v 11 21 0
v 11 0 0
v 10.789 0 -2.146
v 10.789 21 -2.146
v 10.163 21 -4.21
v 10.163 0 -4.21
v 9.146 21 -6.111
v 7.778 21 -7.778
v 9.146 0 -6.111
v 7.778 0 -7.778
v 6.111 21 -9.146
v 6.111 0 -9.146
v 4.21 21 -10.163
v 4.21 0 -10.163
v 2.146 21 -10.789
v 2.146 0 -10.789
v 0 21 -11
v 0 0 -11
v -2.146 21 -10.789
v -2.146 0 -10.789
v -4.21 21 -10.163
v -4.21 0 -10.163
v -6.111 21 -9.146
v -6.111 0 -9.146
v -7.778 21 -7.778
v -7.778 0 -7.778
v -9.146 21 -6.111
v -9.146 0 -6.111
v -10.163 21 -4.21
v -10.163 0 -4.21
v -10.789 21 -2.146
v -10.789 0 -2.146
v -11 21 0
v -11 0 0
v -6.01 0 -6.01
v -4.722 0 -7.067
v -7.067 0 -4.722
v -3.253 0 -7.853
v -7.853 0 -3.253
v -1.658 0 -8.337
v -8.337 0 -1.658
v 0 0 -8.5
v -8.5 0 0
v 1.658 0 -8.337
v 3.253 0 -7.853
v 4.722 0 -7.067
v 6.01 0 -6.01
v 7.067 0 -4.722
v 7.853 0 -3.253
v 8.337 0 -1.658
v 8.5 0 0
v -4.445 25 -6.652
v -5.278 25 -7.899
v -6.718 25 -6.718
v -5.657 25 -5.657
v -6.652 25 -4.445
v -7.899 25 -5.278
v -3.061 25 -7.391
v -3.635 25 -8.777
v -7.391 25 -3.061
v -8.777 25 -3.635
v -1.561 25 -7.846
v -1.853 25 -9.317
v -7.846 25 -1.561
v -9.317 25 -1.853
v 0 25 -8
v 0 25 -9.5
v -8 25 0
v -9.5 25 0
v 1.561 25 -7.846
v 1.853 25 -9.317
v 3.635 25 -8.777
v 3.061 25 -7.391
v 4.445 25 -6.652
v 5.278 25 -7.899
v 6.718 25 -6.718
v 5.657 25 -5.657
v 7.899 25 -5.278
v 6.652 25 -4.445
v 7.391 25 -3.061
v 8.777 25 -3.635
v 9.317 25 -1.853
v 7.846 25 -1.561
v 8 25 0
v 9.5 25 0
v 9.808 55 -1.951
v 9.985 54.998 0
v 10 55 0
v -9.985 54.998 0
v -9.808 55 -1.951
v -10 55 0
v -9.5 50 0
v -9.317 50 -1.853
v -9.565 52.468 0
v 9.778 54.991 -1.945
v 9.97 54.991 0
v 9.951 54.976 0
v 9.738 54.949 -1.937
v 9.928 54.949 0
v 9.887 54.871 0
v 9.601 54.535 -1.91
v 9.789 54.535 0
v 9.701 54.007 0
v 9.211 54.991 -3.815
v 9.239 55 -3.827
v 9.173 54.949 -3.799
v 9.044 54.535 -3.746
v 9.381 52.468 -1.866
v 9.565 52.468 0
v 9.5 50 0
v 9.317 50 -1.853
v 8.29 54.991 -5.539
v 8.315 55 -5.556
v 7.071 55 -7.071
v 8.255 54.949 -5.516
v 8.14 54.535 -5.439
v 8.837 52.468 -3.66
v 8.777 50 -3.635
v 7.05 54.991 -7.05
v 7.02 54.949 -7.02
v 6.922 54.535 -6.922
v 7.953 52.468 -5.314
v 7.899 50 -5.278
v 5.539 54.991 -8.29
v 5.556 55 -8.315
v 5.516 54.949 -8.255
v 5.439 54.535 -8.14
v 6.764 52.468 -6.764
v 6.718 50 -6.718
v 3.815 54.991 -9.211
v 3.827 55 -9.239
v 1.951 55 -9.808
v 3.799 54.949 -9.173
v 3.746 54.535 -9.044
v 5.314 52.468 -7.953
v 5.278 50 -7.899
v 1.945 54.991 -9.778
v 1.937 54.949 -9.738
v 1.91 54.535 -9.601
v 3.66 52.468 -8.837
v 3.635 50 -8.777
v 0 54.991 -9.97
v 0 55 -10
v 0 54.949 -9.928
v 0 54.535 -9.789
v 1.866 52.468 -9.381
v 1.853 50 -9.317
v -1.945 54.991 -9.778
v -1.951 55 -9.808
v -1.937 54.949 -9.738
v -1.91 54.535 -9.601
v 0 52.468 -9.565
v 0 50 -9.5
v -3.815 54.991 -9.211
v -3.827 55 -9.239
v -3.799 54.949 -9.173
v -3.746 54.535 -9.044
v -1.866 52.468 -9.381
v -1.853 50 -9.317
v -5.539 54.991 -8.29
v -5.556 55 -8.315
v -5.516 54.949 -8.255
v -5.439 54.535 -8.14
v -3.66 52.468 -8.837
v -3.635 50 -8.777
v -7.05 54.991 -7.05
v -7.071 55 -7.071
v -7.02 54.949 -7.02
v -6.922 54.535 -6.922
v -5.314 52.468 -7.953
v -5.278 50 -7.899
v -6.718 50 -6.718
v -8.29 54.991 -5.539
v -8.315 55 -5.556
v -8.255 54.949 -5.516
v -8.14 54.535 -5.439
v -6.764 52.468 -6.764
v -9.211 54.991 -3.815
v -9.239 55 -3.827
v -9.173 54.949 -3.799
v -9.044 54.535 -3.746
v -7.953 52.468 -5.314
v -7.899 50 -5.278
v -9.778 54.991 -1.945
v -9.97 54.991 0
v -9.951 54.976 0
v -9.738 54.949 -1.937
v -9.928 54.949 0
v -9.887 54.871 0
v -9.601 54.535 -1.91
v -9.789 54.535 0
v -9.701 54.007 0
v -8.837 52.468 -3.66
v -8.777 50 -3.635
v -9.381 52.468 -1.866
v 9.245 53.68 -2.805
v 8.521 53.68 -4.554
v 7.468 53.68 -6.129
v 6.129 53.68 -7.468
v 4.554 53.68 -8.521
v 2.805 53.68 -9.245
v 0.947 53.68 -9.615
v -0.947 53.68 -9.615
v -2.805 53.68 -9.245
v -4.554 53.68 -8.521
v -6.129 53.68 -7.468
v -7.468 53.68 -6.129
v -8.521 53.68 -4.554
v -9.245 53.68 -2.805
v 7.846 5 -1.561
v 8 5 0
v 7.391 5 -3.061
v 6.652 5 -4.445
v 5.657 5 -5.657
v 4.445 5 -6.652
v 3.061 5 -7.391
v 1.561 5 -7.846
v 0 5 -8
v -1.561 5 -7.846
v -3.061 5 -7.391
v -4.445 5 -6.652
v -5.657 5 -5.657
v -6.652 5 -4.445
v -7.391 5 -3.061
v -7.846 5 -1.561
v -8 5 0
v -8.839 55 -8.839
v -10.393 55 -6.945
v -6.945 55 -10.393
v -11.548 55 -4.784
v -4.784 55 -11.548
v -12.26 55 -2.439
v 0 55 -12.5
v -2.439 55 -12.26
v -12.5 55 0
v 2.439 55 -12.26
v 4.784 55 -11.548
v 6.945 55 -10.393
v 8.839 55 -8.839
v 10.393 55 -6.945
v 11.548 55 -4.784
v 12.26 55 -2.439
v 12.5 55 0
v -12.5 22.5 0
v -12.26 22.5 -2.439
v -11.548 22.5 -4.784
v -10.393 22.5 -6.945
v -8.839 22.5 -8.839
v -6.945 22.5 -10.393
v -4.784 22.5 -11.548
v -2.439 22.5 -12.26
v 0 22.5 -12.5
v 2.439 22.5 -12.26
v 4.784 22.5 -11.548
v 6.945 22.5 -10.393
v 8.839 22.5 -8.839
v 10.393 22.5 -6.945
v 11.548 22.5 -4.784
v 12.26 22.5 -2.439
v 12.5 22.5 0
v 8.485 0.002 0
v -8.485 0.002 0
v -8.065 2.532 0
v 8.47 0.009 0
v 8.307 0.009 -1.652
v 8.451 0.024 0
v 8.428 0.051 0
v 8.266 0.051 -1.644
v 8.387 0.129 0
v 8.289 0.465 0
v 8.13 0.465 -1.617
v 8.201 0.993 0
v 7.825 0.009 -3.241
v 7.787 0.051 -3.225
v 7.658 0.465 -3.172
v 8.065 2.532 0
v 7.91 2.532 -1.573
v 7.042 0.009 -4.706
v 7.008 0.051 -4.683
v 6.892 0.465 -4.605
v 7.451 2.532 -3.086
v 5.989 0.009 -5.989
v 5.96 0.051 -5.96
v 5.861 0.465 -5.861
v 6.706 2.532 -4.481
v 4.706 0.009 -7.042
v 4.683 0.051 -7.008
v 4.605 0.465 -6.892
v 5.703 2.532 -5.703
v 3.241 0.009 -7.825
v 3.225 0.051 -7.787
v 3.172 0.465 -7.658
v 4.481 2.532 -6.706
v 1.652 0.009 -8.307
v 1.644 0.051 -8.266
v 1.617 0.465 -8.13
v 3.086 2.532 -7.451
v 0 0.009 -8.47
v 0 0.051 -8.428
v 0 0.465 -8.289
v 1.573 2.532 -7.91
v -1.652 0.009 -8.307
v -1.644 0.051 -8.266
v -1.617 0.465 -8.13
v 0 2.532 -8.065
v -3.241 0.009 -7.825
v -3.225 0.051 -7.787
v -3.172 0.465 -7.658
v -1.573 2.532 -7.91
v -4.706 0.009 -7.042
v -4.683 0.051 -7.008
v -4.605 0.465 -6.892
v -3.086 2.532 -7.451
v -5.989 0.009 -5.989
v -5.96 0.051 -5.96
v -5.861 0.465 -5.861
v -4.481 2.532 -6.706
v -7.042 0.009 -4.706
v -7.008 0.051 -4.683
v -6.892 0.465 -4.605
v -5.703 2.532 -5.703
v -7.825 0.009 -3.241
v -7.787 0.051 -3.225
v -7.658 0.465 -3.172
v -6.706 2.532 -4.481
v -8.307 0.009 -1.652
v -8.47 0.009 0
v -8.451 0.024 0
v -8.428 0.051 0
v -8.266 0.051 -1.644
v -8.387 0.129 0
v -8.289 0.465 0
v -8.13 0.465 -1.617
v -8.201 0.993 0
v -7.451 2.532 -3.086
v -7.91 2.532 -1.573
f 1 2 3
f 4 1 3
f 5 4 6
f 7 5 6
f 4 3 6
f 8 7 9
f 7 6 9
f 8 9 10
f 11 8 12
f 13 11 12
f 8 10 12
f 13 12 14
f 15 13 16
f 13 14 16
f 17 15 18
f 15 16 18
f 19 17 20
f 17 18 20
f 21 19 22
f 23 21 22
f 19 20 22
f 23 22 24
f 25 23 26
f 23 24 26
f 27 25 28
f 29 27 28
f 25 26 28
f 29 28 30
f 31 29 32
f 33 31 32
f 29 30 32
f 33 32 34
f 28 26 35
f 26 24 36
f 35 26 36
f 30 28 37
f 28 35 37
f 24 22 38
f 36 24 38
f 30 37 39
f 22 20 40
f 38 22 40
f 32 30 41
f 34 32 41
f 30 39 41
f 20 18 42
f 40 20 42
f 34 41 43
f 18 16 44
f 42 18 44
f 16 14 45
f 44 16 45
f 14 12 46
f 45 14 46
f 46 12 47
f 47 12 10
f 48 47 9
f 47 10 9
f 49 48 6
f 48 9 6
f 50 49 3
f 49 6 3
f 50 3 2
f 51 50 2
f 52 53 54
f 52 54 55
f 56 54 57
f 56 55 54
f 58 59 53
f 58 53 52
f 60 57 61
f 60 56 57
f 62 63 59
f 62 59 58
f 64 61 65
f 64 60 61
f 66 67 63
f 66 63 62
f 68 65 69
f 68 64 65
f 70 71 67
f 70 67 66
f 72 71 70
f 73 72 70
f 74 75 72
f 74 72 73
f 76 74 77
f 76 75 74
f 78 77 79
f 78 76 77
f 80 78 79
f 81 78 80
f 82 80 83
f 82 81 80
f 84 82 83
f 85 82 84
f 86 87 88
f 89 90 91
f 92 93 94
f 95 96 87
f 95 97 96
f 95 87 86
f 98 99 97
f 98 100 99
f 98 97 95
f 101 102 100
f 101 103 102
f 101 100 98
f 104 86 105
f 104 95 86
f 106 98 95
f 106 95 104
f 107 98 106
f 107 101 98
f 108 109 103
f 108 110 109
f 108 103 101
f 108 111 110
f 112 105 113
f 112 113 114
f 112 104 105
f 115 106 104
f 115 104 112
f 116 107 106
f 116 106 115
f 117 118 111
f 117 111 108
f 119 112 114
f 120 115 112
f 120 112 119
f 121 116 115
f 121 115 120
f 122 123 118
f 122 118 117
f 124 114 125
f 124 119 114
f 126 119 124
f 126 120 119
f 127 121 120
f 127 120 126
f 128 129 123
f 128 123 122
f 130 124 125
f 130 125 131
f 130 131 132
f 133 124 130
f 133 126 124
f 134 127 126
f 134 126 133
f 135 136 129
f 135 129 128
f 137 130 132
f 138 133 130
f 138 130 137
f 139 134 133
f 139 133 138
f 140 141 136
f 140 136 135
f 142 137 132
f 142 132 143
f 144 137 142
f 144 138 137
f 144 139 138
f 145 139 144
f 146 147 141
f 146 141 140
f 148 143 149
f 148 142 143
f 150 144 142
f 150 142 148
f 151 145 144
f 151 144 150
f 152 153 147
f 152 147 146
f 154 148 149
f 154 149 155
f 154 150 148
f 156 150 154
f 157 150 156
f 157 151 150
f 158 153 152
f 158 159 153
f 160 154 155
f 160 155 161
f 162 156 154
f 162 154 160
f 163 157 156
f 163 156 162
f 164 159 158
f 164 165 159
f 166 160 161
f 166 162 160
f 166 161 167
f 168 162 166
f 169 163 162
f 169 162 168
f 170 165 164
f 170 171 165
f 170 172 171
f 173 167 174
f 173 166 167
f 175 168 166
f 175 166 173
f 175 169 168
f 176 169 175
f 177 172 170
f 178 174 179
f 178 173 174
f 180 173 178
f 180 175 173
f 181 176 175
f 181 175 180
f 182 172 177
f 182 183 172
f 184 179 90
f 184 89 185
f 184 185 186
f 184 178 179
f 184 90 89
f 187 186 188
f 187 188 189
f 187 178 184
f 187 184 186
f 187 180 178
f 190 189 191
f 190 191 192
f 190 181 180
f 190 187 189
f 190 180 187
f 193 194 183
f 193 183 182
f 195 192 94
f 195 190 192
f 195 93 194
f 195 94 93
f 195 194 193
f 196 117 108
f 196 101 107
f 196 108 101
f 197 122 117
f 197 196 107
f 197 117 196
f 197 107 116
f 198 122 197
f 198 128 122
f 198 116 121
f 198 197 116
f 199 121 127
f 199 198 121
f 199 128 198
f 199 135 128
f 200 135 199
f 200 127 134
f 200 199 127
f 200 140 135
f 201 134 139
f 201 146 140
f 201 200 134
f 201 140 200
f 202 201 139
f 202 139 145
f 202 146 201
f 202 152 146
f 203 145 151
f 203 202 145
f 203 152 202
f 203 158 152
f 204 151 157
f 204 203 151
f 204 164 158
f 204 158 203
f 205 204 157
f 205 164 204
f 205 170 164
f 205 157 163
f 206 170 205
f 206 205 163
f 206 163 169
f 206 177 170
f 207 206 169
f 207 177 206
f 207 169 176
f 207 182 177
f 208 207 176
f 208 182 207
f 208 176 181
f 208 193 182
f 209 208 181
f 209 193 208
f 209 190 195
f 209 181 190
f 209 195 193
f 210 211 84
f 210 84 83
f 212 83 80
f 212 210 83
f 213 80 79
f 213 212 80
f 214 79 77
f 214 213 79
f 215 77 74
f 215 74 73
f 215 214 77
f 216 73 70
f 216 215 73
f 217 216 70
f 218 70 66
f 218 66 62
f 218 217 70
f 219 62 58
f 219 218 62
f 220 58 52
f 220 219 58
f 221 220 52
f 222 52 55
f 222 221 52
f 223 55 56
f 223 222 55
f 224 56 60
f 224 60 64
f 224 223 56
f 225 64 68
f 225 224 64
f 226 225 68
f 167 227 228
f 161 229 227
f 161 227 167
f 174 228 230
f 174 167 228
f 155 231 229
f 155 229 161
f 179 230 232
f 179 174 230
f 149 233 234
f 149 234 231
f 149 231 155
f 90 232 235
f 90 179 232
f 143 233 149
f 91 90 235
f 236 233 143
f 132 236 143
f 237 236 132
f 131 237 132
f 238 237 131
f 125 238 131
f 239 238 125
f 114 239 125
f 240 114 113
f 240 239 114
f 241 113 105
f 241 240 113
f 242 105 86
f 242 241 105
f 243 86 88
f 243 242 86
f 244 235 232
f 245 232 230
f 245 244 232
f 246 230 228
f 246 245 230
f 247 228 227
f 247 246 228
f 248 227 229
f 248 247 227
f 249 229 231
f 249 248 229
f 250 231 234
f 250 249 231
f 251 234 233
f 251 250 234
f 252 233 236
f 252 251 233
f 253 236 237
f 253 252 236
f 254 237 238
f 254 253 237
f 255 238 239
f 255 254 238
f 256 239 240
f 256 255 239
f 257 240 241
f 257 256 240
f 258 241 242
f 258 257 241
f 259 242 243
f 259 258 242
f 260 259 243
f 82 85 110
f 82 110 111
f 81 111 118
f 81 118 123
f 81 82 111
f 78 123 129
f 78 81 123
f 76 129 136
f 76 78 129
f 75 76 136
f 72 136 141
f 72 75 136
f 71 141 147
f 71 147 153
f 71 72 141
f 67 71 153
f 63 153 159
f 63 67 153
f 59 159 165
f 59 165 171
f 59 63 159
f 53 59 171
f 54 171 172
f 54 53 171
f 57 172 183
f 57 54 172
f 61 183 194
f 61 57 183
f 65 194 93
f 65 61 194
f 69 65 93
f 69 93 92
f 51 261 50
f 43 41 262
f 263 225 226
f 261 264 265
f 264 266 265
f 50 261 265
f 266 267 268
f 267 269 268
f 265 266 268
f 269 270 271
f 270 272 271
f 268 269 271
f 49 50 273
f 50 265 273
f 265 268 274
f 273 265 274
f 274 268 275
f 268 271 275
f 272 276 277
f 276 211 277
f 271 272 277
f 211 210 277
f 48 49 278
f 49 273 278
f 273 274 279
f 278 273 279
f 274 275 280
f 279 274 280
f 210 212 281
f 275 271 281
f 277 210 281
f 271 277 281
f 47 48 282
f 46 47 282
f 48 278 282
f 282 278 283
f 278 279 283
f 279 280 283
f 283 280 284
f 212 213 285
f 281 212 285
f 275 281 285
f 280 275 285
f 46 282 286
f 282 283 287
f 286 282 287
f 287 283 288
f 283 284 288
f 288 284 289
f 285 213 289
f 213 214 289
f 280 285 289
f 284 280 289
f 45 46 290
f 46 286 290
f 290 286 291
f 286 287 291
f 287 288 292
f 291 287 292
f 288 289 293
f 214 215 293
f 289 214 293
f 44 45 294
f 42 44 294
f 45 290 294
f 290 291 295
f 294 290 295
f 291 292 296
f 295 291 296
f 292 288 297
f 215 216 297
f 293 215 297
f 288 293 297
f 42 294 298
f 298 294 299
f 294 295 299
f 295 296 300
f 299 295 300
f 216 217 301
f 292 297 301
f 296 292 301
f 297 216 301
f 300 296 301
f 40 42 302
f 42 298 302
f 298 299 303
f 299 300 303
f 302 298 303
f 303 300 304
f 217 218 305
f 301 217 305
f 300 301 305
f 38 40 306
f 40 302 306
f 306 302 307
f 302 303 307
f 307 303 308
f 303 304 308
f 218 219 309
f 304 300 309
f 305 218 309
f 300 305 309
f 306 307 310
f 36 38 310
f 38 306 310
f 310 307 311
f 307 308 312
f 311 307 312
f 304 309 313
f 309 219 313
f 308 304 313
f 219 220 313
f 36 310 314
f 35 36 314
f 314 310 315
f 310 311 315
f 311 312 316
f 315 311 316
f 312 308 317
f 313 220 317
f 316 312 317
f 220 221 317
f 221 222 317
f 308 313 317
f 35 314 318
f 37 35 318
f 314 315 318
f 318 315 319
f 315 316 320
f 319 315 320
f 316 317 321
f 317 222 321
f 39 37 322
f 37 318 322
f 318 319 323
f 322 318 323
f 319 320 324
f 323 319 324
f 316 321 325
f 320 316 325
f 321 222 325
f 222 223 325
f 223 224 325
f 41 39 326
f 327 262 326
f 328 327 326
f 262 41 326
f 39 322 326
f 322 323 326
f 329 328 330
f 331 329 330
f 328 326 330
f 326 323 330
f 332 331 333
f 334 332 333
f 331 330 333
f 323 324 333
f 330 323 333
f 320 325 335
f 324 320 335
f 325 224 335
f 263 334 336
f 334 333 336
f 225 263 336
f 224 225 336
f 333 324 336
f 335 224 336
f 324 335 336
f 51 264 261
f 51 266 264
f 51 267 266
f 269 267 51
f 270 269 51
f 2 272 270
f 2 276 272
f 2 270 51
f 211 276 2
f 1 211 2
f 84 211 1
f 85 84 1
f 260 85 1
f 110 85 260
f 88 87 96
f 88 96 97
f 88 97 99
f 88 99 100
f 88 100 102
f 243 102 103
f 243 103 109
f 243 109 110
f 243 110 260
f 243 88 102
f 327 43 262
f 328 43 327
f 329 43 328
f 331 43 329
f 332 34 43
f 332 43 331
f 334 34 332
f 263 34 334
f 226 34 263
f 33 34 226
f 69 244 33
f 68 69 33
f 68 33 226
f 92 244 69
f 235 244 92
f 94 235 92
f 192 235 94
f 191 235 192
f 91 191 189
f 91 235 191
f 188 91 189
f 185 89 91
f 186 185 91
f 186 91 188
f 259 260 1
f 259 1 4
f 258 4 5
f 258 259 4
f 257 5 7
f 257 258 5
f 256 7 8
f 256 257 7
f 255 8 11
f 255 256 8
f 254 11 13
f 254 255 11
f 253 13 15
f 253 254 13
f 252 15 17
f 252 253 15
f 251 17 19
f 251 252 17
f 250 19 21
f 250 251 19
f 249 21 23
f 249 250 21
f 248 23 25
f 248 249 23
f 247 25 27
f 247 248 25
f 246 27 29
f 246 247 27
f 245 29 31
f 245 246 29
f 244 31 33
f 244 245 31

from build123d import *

# Parameters (mm, degrees)
SKETCH_1_R          = 11
SKETCH_1_R_2        = 8
EXTRUDE_1_DEPTH     = 25
SKETCH_2_R          = 12.5
SKETCH_2_R_2        = 9.5
EXTRUDE_2_DEPTH     = 30
CHAMFER_2_SIZE      = 4
FILLET_1_SIZE       = 0.5
FILLET_1_SIZE_2     = 5
FILLET_2_SIZE       = 0.5
FILLET_2_SIZE_2     = 5
SKETCH_3_W          = 25
SKETCH_3_H          = 12.5
CUT_EXTRUDE_2_DEPTH = 58.771100137


with BuildPart() as part:
    # 草图1 → 凸台-拉伸1 (new body)
    with BuildSketch(Plane(origin=(0, 0, 0), x_dir=(1, 0, 0), z_dir=(0, 1, 0))):
        with Locations(Location((0, 0, 0), (0, 0, 270))):
            Circle(SKETCH_1_R)
        with Locations(Location((0, 0, 0), (0, 0, 270))):
            Circle(SKETCH_1_R_2, mode=Mode.SUBTRACT)
    extrude(amount=EXTRUDE_1_DEPTH)

    # 草图2 → 凸台-拉伸2 (add)
    with BuildSketch(Plane(origin=(0, 25, 0), x_dir=(1, 0, 0), z_dir=(0, 1, 0))):
        with Locations(Location((0, 0, 0), (0, 0, 270))):
            Circle(SKETCH_2_R)
        with Locations(Location((0, 0, 0), (0, 0, 270))):
            Circle(SKETCH_2_R_2, mode=Mode.SUBTRACT)
    extrude(amount=EXTRUDE_2_DEPTH)

    # 倒角2
    # the kernel refuses this chamfer: 4 mm, written as the material it adds along each edge
    with BuildSketch(Plane(origin=(0, 25, 0), x_dir=(0, 0, 1), z_dir=(-1, 0, 0))) as chamfer_2_piece_1_section:
        Polygon((11, -CHAMFER_2_SIZE), (11 + CHAMFER_2_SIZE, 0), (11, 0), align=None)
    chamfer_2_piece_1 = revolve(axis=Axis((0, 25, 0), (0, 1, 0)), mode=Mode.PRIVATE)
    chamfer_2_piece_1 = chamfer_2_piece_1 & Plane(origin=(0, 21.745250117, 0), x_dir=(0, 0, 1), z_dir=(0, -1, 0)) * Cylinder(12.5, 60, mode=Mode.PRIVATE)
    add(chamfer_2_piece_1)

    # 圆角1
    # an asymmetric fillet: 5, 0.5 mm, written as the material it takes off along each edge
    with BuildSketch(Plane(origin=(0, 0, 0), x_dir=(0, 0, 1), z_dir=(-1, 0, 0))) as fillet_1_piece_1:
        with BuildLine():
            Bezier((8 + FILLET_1_SIZE, 0), (8, 0), (8, FILLET_1_SIZE_2), weights=[1, 0.707106781, 1])
            Line((8, FILLET_1_SIZE_2), (8, 0))
            Line((8, 0), (8 + FILLET_1_SIZE, 0))
        make_face()
    revolve(axis=Axis((0, 0, 0), (0, 1, 0)), mode=Mode.SUBTRACT)

    # 圆角2
    # an asymmetric fillet: 5, 0.5 mm, written as the material it takes off along each edge
    with BuildSketch(Plane(origin=(0, 55, 0), x_dir=(0, 0, 1), z_dir=(-1, 0, 0))) as fillet_2_piece_1:
        with BuildLine():
            Bezier((9.5 + FILLET_2_SIZE, 0), (9.5, 0), (9.5, -FILLET_2_SIZE_2), weights=[1, 0.707106781, 1])
            Line((9.5, -FILLET_2_SIZE_2), (9.5, 0))
            Line((9.5, 0), (9.5 + FILLET_2_SIZE, 0))
        make_face()
    revolve(axis=Axis((0, 55, 0), (0, 1, 0)), mode=Mode.SUBTRACT)

    # 草图3 → 切除-拉伸2 (cut, through all)
    with BuildSketch(Plane(origin=(0, 55, 0), x_dir=(1, 0, 0), z_dir=(0, 1, 0))):
        with Locations((0, -6.25)):
            Rectangle(SKETCH_3_W, SKETCH_3_H)
    extrude(amount=-CUT_EXTRUDE_2_DEPTH, mode=Mode.SUBTRACT)


solid = part.part
